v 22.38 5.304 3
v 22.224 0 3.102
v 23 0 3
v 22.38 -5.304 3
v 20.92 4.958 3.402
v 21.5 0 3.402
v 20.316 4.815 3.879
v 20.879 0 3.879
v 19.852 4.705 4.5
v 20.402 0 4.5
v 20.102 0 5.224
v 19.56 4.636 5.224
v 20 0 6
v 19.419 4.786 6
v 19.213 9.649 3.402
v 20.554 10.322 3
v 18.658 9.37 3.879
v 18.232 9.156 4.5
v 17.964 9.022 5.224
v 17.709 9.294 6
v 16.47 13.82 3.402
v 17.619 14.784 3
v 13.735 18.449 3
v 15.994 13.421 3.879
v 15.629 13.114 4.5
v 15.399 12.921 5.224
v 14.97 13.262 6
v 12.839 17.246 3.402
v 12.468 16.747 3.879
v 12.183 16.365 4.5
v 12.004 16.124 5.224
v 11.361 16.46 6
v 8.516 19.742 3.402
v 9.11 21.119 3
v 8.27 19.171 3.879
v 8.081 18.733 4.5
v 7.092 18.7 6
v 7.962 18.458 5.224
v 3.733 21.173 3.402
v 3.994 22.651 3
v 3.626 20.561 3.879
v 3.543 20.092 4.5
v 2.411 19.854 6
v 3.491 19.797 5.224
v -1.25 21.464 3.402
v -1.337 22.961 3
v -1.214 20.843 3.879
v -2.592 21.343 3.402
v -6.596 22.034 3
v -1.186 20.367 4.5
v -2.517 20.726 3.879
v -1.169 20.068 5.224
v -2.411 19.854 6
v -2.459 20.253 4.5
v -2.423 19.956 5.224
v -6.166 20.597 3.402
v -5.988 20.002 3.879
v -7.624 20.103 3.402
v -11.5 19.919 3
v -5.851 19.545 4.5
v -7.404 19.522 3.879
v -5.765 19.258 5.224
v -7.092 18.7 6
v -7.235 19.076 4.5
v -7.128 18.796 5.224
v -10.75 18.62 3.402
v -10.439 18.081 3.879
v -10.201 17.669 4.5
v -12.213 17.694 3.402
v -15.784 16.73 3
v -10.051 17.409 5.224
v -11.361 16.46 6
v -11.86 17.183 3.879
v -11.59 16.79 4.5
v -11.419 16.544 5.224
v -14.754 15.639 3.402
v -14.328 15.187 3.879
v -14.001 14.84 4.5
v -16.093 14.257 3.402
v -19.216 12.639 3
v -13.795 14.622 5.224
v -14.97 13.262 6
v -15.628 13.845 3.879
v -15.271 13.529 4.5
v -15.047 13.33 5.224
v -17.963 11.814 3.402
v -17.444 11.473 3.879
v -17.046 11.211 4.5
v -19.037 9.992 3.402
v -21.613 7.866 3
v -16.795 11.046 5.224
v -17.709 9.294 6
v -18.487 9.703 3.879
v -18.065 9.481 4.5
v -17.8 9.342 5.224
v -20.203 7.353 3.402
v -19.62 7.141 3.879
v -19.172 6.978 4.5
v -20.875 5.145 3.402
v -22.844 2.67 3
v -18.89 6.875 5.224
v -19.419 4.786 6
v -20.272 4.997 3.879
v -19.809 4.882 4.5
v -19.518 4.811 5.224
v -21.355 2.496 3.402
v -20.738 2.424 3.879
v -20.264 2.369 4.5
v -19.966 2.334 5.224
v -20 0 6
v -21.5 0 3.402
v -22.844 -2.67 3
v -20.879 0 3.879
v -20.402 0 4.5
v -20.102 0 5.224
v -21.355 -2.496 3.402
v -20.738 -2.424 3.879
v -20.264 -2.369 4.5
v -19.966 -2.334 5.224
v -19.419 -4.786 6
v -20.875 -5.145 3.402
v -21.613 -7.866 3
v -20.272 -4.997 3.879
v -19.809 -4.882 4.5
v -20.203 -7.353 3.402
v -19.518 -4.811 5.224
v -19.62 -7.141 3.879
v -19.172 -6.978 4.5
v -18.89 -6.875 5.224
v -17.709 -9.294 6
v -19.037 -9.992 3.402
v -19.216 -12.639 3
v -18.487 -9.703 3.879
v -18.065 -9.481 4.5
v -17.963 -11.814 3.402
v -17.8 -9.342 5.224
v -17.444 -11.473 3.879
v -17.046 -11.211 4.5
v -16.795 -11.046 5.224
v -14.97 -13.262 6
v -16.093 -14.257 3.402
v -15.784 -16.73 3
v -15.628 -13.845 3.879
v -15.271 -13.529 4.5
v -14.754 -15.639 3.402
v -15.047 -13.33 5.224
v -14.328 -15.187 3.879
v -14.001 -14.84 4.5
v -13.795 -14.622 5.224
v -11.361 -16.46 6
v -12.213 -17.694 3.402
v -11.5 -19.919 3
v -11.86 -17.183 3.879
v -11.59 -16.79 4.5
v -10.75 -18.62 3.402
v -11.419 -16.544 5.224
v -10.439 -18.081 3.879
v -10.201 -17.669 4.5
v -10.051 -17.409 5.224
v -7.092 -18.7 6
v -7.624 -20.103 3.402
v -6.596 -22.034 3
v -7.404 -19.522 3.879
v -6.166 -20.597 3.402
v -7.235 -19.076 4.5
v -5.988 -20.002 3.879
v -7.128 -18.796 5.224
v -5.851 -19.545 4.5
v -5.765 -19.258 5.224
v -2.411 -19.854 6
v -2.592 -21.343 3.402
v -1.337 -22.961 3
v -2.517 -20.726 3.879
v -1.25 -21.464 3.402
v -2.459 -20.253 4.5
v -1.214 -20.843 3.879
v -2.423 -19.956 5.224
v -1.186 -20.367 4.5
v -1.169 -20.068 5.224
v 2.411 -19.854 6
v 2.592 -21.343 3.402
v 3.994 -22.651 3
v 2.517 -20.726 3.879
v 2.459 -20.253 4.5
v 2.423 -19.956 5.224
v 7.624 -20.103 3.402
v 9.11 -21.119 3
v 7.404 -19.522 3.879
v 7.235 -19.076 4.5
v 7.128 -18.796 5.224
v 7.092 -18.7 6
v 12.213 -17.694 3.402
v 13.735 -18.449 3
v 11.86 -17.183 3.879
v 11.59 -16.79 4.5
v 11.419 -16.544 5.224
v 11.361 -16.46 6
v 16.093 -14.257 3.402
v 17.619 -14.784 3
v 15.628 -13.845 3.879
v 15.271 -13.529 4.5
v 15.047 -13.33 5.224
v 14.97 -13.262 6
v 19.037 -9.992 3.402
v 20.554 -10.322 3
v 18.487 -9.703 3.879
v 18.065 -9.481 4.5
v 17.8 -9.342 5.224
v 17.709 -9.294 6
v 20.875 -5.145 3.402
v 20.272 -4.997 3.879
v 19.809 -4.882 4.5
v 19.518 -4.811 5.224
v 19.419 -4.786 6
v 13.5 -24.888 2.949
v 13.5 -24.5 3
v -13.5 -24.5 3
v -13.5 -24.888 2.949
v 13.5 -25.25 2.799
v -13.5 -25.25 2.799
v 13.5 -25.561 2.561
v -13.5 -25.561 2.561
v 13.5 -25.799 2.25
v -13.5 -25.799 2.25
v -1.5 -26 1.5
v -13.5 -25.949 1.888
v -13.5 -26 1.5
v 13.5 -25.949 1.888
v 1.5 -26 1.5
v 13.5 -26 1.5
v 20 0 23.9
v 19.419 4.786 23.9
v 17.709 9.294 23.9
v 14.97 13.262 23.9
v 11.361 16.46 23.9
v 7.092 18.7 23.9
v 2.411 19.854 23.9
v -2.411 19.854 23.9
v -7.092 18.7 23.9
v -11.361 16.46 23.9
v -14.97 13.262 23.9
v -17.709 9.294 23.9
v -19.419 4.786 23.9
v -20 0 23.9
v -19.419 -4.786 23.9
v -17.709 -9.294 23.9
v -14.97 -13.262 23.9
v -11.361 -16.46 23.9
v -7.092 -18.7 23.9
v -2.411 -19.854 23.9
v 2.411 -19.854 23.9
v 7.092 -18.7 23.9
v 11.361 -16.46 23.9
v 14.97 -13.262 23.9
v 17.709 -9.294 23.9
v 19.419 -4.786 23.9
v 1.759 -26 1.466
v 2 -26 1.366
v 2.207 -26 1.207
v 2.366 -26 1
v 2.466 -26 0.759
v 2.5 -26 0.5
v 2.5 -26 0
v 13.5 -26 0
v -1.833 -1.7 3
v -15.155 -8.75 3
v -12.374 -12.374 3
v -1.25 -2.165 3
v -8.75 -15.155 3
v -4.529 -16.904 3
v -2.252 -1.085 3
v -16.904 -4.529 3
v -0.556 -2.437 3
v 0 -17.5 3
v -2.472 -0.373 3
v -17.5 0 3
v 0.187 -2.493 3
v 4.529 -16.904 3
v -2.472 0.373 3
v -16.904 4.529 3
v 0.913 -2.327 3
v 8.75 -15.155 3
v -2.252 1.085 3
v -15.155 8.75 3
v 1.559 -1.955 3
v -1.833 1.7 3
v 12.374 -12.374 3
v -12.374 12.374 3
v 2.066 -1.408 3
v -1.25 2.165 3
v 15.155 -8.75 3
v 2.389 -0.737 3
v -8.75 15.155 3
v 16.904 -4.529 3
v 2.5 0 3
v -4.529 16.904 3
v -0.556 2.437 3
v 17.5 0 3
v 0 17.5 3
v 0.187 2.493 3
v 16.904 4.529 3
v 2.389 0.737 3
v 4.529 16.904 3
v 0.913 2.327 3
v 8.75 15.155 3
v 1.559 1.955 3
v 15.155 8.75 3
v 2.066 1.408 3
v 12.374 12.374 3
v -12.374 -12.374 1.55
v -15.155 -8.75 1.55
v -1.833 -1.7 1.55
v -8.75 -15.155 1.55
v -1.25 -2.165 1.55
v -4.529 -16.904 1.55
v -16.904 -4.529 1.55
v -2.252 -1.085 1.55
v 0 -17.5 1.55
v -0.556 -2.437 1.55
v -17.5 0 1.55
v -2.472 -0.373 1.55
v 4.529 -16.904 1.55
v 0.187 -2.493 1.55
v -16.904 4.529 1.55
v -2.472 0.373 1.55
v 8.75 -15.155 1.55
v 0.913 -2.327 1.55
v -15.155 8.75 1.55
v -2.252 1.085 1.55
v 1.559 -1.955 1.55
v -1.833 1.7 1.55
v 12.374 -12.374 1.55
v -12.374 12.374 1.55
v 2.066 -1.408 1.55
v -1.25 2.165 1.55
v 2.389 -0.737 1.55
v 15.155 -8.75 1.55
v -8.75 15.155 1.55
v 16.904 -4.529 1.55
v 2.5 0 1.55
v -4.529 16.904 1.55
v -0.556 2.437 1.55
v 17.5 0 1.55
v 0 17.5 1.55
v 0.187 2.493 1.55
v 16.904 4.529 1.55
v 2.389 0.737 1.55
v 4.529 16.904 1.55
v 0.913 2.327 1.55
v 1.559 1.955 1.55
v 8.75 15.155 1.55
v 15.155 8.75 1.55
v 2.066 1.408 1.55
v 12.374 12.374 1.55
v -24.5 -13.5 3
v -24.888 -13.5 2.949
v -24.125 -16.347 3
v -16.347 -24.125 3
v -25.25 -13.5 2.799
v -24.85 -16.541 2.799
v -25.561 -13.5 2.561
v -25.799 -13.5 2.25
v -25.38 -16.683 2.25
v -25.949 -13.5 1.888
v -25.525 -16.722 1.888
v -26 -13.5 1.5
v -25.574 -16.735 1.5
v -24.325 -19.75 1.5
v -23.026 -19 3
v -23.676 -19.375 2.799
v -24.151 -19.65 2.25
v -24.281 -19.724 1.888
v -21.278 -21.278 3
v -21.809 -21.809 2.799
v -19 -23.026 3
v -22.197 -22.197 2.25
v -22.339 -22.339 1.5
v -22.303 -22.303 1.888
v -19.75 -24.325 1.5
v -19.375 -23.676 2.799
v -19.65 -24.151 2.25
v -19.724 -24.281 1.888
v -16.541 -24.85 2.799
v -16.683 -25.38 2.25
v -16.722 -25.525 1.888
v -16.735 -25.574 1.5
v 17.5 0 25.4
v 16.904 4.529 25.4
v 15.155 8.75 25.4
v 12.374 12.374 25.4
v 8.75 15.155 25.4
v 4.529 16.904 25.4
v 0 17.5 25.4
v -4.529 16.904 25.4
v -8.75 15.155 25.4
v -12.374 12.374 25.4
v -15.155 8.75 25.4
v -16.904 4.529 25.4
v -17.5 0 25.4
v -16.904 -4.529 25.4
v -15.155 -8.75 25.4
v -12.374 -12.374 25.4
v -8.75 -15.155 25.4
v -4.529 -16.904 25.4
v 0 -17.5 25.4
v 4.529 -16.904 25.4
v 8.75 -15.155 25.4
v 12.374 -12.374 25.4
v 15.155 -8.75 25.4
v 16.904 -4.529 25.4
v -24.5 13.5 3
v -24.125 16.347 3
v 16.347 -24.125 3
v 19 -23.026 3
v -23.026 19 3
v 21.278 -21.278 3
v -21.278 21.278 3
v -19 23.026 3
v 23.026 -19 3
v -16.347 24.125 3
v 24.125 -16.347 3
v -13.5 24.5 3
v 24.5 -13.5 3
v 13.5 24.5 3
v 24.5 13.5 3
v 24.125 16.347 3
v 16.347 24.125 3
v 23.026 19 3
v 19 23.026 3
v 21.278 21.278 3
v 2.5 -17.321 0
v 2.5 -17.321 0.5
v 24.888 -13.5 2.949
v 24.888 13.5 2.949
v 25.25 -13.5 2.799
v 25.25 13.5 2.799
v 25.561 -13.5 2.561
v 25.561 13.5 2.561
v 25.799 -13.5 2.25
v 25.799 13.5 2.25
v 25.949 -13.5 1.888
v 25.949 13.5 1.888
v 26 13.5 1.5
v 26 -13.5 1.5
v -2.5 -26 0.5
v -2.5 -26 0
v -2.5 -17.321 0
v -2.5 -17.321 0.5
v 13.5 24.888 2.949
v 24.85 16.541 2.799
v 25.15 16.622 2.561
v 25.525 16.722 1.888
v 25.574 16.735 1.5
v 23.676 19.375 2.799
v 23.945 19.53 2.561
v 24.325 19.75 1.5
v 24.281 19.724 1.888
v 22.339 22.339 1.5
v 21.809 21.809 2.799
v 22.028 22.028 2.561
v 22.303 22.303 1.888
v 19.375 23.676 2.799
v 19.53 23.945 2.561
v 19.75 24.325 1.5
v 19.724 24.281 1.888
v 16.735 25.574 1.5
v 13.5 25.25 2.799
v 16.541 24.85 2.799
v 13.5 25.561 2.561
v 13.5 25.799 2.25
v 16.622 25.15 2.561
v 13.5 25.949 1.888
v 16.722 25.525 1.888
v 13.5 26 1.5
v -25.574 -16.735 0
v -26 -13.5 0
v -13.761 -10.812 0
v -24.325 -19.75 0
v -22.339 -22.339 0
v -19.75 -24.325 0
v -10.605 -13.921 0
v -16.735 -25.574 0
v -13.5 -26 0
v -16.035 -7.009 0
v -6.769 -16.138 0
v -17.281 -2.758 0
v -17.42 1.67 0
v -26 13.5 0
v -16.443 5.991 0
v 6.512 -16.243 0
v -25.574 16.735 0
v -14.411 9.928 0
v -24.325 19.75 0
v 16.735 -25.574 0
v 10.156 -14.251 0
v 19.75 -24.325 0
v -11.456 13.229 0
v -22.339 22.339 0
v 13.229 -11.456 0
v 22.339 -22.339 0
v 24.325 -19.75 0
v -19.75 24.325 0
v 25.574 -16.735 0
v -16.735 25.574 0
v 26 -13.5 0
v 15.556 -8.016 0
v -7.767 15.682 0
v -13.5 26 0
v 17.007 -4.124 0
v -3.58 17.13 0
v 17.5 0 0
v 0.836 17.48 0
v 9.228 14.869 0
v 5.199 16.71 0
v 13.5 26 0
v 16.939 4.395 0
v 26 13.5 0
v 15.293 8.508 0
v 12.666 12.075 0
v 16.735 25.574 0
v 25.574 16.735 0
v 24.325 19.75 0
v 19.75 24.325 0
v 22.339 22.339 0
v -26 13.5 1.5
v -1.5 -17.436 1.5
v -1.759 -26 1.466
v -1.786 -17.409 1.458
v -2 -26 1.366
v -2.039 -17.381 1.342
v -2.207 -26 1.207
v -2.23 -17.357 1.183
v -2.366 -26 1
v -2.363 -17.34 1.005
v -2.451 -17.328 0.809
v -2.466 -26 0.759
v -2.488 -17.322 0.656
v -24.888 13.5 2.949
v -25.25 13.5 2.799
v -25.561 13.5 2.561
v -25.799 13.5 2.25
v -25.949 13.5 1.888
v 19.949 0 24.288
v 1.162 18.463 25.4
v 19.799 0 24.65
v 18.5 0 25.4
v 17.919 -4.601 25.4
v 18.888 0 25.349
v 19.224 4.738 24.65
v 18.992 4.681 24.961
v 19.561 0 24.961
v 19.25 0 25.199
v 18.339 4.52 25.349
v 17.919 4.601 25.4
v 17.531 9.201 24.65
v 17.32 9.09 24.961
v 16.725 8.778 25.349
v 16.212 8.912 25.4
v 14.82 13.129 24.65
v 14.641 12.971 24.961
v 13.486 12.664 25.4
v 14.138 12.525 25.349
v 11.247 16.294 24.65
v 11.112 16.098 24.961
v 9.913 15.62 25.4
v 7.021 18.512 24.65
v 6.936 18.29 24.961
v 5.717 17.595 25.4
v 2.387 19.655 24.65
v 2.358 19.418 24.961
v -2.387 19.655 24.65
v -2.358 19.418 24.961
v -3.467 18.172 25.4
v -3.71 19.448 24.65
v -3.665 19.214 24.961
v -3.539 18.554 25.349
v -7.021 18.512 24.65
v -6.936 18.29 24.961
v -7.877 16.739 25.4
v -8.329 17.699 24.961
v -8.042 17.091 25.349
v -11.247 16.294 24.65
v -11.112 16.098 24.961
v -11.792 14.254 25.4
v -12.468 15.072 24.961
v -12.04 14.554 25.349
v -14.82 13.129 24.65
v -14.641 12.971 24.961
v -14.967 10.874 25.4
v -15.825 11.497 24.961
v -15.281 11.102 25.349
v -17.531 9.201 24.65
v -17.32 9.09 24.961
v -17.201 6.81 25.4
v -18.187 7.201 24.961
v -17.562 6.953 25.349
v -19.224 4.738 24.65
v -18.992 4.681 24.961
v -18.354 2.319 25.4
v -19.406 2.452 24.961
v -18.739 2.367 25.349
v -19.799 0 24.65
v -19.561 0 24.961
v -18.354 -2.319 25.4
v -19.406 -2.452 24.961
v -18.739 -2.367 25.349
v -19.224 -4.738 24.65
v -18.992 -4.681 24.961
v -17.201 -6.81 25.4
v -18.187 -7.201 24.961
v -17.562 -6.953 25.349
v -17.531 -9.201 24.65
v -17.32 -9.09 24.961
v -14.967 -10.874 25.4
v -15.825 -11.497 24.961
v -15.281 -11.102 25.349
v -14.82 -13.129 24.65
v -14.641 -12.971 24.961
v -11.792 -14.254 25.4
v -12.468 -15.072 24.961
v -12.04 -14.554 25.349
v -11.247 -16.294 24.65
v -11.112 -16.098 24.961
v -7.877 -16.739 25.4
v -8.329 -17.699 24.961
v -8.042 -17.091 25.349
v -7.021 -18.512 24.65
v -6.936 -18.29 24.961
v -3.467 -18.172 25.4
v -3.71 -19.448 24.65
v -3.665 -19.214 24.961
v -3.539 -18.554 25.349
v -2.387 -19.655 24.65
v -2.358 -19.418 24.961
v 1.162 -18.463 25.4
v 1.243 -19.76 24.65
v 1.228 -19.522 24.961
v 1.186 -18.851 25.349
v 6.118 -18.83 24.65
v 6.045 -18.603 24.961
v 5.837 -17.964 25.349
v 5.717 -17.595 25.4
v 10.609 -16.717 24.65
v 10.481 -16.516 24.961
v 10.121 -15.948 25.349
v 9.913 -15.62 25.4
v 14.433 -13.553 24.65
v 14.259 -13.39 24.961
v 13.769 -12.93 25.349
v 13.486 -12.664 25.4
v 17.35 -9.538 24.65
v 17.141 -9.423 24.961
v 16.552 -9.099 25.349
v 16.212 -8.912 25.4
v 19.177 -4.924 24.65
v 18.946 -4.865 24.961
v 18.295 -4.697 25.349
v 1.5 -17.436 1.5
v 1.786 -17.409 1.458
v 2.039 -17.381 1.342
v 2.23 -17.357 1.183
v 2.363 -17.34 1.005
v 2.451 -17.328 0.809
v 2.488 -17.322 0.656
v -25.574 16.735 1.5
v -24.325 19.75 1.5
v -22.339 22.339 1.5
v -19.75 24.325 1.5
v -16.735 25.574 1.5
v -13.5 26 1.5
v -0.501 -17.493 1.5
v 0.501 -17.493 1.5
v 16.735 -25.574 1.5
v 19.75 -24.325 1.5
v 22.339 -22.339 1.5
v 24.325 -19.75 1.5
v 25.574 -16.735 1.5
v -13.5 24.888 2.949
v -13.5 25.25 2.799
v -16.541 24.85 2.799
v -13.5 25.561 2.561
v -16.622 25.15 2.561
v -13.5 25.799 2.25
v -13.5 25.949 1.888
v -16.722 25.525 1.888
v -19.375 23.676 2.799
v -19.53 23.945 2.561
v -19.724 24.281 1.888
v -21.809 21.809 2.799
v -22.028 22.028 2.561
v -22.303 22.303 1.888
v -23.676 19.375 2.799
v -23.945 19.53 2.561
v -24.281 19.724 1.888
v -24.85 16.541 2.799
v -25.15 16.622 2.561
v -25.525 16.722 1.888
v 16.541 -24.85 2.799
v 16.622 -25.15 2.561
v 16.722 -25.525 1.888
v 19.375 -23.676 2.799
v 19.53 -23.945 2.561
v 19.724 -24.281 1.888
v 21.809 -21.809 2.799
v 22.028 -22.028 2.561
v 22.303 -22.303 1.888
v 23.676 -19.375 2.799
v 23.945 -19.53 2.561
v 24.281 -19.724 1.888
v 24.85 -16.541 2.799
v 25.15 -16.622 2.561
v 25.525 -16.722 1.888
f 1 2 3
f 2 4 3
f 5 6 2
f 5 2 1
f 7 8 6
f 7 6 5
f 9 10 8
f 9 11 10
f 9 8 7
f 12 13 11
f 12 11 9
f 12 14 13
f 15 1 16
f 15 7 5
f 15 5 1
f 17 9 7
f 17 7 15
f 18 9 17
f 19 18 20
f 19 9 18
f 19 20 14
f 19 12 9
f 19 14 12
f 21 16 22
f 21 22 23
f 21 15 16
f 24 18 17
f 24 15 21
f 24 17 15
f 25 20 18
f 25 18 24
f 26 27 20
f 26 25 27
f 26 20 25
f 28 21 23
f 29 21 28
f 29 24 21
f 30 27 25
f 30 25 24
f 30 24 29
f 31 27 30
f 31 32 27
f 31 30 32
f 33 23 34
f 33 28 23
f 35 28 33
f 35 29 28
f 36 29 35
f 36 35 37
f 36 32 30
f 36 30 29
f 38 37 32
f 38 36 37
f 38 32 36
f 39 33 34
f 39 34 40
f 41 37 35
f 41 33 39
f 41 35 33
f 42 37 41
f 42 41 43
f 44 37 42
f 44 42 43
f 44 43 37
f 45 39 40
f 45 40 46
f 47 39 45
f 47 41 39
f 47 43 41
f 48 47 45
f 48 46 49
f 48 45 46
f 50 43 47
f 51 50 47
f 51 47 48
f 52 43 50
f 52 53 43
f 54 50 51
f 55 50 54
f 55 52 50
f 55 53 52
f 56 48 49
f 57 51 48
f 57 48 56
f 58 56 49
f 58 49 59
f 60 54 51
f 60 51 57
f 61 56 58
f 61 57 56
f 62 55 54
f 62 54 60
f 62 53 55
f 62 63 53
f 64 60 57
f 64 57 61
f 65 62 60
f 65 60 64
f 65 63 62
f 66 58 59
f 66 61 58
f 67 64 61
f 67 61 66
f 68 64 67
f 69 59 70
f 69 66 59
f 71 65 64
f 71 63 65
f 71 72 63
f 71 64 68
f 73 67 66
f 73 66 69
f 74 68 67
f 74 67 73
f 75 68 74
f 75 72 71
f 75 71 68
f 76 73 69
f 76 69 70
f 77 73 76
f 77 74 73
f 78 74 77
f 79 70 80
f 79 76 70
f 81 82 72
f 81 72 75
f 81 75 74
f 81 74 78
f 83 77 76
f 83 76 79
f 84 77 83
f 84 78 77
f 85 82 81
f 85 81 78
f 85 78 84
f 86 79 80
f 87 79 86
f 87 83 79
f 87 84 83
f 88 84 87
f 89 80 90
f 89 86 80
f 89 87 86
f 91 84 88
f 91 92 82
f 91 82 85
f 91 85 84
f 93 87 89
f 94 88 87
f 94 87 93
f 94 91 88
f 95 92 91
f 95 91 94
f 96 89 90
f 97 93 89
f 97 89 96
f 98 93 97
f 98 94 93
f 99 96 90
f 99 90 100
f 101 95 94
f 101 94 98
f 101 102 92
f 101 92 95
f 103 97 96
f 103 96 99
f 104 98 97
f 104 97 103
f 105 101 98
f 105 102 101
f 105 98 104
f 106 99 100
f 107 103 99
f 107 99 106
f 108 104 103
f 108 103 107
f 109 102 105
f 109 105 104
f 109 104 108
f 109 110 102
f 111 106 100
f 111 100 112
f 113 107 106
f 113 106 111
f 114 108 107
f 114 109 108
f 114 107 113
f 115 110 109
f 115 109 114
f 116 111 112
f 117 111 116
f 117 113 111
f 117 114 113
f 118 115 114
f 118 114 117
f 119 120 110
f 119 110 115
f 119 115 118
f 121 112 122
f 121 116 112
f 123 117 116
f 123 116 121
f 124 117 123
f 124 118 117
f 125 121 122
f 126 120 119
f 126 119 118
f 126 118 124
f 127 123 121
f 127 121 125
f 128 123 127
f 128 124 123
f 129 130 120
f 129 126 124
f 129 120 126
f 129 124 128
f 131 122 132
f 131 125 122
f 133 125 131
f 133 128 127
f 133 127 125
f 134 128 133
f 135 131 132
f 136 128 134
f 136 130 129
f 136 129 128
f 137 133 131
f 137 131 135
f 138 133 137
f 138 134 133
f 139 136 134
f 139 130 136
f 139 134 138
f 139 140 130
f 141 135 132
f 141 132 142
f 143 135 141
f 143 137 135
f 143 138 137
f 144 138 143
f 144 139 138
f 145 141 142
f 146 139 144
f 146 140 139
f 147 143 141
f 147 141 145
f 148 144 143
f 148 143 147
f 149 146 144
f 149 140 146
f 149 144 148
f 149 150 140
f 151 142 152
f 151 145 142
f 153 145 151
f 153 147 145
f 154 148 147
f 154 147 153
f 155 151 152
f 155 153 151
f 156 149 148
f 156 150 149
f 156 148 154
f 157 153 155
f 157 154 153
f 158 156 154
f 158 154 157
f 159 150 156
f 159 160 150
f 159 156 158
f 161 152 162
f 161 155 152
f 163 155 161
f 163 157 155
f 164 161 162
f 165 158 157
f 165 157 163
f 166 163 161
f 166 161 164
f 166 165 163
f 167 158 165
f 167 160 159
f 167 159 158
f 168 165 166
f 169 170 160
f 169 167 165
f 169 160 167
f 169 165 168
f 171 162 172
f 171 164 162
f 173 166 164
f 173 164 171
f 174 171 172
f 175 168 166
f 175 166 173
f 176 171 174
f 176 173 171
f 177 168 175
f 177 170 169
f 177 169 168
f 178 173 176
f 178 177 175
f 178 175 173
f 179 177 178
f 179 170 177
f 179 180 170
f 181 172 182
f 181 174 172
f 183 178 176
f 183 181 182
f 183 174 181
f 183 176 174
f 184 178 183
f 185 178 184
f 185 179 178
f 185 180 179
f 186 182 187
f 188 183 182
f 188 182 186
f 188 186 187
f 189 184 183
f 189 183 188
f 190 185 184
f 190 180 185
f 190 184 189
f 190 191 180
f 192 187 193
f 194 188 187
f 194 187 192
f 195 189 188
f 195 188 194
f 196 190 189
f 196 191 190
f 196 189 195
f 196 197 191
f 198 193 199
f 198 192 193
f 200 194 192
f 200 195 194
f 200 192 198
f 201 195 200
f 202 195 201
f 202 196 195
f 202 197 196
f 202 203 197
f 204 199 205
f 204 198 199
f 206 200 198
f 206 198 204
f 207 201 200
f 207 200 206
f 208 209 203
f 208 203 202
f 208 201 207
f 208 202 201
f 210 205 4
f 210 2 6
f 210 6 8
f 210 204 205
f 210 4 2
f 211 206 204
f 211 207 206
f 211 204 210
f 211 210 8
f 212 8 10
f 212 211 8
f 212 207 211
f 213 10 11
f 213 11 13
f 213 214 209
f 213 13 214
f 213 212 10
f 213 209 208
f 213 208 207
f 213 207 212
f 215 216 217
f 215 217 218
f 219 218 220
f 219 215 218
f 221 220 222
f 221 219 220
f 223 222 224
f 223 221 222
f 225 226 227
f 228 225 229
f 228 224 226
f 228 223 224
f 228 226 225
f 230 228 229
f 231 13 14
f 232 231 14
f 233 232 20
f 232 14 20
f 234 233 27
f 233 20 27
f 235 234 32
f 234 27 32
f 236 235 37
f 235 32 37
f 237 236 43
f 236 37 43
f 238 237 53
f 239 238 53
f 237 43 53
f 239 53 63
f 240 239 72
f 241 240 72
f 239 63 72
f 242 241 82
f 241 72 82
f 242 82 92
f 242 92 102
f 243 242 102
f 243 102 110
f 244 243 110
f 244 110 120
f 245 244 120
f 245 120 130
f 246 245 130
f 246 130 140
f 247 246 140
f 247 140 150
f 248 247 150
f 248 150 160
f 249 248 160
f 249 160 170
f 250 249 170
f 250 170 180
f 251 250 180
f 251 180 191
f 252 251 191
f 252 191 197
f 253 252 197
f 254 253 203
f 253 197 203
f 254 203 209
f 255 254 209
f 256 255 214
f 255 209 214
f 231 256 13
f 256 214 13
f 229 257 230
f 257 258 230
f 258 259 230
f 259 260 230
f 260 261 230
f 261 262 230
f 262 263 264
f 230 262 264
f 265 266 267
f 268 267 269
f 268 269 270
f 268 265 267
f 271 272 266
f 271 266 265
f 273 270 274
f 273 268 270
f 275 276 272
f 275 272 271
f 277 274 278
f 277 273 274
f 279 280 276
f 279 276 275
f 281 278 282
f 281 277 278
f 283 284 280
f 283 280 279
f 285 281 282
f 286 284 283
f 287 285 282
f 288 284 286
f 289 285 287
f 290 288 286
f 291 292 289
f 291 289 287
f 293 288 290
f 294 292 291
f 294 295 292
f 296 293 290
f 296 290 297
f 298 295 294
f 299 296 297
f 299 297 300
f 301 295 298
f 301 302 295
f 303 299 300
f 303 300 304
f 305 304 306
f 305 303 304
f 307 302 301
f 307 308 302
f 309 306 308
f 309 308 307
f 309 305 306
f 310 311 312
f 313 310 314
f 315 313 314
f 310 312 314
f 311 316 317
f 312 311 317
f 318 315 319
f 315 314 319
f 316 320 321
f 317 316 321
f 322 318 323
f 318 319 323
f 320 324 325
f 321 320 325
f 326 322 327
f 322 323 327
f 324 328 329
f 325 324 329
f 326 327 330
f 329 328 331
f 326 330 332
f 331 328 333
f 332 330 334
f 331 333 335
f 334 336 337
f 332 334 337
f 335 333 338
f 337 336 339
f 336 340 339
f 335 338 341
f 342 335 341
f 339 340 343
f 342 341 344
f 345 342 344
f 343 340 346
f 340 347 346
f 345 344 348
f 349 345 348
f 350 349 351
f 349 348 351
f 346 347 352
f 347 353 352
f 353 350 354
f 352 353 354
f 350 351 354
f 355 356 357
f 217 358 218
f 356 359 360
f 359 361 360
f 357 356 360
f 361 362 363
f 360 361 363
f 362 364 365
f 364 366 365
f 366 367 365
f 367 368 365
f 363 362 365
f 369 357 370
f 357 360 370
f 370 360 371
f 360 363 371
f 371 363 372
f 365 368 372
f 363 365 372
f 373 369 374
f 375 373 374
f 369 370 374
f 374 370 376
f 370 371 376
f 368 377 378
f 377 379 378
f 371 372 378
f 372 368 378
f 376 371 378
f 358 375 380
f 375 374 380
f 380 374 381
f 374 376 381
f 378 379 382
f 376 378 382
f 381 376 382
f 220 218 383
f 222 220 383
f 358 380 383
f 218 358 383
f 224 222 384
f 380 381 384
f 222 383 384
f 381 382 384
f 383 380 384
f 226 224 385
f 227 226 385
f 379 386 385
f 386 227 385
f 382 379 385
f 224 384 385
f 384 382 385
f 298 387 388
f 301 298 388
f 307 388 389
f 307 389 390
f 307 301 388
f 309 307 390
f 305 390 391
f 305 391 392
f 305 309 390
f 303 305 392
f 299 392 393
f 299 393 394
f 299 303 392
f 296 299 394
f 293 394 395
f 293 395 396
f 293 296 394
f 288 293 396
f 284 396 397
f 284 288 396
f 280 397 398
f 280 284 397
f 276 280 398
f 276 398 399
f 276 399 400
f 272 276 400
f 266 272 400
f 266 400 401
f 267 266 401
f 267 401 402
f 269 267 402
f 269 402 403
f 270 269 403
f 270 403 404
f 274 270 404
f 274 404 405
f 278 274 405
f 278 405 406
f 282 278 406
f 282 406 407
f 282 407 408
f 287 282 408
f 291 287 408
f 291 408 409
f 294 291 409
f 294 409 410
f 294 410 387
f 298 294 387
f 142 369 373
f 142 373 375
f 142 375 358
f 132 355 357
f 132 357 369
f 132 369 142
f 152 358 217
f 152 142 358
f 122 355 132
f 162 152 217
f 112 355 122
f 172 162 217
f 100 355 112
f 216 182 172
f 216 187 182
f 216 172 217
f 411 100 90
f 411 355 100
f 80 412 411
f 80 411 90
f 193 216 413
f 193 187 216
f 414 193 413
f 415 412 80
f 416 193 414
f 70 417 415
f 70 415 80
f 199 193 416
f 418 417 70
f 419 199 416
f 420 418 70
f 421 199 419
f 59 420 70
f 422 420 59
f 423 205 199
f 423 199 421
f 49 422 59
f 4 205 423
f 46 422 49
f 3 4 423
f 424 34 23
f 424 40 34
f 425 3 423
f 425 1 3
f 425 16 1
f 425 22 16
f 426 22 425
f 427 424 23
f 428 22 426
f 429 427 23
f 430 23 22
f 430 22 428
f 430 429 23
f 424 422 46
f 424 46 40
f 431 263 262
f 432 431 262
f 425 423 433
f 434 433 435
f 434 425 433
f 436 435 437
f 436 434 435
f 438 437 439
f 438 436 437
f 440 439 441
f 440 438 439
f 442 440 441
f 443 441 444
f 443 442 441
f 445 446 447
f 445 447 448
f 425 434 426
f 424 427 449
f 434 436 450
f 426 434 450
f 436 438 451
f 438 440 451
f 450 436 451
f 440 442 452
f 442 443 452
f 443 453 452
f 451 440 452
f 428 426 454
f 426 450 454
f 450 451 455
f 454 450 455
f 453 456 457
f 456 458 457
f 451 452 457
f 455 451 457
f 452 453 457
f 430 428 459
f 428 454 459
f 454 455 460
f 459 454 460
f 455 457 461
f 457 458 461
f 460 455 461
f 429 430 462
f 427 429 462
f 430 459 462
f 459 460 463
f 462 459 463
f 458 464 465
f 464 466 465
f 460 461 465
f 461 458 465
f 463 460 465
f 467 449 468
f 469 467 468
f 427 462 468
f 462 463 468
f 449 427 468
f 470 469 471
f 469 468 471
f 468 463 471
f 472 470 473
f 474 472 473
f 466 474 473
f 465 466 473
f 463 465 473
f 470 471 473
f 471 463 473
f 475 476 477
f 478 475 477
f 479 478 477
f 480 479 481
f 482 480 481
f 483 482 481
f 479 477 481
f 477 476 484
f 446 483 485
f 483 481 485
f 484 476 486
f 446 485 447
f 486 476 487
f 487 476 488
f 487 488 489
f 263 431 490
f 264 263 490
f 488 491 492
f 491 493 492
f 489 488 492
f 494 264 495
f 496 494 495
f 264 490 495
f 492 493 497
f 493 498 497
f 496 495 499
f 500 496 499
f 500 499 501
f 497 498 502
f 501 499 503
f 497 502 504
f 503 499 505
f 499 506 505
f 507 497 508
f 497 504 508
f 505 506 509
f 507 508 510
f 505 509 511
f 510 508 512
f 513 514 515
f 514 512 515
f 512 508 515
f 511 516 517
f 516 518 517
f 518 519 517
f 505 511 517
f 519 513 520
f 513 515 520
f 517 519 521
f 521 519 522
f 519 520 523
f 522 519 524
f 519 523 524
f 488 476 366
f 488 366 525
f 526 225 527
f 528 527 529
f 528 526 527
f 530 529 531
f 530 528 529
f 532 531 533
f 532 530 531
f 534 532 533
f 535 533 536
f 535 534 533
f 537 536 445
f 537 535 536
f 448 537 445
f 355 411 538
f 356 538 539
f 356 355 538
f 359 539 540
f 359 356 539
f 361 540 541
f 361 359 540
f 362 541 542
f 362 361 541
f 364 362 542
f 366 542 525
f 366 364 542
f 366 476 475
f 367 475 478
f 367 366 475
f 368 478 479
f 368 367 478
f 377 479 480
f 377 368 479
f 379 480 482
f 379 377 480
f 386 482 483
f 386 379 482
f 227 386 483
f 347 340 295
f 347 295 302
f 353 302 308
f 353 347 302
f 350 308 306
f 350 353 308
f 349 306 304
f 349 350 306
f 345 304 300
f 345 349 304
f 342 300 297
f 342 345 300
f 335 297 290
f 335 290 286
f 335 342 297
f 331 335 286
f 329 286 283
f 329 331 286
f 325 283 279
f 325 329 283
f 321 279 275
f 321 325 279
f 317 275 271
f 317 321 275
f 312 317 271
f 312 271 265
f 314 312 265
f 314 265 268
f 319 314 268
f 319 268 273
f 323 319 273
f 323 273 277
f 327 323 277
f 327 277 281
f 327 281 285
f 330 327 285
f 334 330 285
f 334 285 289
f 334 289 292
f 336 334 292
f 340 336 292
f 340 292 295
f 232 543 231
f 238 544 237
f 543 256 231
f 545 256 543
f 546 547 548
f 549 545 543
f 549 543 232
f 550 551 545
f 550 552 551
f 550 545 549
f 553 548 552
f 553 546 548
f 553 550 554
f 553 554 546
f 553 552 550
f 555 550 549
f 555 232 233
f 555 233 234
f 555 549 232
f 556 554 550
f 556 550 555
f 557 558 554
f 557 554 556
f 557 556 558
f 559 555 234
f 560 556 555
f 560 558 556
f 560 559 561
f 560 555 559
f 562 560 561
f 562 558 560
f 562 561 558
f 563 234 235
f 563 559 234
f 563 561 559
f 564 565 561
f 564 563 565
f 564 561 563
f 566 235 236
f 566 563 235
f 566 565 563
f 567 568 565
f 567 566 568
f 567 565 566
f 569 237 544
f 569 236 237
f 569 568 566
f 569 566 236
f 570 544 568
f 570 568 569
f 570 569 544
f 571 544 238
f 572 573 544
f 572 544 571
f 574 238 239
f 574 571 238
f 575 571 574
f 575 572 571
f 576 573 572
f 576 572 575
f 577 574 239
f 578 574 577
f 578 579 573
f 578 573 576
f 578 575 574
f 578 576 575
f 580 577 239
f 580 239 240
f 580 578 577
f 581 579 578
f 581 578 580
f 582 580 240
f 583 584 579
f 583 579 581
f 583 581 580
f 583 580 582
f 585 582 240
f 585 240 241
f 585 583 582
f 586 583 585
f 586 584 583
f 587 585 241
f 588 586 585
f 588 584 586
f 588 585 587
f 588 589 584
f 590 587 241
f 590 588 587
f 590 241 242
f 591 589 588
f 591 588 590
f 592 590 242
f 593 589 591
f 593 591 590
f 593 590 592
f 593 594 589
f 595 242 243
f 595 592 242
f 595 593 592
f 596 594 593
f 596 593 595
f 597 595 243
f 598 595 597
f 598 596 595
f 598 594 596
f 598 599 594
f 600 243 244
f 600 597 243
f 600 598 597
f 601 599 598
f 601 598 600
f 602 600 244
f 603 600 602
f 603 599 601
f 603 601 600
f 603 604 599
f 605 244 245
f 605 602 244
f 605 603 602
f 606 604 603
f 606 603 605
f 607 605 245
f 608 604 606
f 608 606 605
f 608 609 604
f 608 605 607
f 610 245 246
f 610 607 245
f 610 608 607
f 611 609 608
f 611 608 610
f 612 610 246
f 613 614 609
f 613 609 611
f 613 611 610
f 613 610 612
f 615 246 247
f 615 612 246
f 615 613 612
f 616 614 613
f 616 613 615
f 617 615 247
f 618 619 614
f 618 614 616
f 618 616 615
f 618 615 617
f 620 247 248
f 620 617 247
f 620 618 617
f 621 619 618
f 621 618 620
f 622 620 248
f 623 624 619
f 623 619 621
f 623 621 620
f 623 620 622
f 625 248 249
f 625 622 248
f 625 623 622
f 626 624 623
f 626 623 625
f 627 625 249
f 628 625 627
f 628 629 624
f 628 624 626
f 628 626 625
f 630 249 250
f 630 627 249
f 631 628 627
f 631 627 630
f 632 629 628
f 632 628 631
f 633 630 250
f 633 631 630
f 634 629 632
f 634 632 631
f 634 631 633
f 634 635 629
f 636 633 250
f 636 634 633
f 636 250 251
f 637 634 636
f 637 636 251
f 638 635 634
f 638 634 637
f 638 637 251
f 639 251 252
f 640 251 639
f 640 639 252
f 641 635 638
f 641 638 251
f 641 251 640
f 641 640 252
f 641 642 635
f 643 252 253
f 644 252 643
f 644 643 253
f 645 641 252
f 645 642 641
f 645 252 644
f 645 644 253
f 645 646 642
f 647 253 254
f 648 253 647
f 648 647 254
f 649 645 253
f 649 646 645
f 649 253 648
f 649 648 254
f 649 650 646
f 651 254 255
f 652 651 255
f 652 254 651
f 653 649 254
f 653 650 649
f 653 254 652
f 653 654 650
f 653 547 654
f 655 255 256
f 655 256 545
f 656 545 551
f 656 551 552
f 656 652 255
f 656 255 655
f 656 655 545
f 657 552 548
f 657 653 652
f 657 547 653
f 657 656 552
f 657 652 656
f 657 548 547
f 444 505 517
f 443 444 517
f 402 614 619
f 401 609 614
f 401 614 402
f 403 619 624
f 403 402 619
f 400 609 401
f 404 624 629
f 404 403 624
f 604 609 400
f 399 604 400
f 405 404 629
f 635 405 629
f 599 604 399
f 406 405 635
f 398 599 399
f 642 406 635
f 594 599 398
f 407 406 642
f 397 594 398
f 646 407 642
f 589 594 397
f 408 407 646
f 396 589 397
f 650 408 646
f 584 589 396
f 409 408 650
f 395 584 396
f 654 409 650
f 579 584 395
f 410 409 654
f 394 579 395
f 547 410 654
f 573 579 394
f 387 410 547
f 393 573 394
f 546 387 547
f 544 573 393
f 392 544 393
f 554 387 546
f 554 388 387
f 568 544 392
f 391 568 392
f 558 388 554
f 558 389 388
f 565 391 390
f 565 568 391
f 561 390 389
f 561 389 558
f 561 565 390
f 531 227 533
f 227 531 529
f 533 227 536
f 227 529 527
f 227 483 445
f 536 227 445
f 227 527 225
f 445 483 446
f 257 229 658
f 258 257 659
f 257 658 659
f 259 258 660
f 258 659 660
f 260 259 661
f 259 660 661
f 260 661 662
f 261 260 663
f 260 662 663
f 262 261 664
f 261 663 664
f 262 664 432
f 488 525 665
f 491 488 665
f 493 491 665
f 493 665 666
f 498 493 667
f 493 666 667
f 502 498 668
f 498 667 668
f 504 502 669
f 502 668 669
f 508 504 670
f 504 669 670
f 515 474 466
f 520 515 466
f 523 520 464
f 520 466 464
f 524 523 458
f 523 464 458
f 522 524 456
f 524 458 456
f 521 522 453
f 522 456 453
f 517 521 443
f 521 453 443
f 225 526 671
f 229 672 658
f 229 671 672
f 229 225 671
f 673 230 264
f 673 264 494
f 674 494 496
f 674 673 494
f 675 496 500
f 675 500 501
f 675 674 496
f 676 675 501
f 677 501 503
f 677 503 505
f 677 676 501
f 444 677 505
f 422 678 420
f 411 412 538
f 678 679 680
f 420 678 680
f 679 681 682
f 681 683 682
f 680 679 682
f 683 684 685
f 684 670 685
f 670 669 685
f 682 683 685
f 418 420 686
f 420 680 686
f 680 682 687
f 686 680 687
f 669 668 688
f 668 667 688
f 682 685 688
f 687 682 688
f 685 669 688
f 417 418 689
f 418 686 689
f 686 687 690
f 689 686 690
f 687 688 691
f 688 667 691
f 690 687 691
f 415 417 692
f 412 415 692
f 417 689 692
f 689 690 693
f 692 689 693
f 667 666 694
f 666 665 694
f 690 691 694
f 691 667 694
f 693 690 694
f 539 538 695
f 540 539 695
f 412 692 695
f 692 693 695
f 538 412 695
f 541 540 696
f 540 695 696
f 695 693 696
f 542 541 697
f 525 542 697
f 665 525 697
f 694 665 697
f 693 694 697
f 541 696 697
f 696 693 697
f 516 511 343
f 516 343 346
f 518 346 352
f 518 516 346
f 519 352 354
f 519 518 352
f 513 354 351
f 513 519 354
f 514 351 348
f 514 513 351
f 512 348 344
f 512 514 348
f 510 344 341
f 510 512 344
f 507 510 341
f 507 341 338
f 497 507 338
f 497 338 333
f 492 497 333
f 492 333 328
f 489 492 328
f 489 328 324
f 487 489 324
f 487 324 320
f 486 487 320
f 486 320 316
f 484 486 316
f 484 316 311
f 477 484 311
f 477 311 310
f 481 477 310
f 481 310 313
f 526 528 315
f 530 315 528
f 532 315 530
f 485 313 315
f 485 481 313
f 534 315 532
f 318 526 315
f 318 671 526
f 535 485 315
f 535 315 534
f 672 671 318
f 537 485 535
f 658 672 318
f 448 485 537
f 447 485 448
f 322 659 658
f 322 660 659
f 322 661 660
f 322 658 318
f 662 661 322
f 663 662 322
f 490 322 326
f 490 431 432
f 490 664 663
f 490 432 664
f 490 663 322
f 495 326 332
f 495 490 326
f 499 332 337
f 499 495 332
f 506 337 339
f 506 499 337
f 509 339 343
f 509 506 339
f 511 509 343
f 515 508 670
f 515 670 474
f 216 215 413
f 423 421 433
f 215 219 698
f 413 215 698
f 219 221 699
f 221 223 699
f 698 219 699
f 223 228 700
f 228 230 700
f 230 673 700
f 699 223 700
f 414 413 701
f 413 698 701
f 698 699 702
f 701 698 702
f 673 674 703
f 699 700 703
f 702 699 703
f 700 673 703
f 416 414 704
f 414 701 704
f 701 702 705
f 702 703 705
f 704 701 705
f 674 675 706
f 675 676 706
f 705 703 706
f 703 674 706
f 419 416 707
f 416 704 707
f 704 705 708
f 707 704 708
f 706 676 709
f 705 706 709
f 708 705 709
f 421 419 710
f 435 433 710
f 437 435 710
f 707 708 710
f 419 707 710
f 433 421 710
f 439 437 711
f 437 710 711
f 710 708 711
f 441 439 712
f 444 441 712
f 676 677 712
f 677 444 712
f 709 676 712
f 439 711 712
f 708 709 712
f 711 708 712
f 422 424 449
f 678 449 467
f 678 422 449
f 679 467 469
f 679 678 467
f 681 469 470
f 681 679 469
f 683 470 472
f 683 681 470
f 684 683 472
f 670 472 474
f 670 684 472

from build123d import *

# Parameters (mm, degrees)
F0_W     = 52
F0_H     = 52
F0_R     = 20
F1_DEPTH = 3
F0_R_2   = 17.5
F0_R_3   = 2.5
F2_DEPTH = 25.4
F3_DEPTH = 1.55
F4_R     = 12.5
F5_R     = 1.5
F6_R     = 3
F7_W     = 5
F7_H     = 1.5
F8_DEPTH = 25.4
F9_R     = 1


with BuildPart() as f1:
    # F0 (on Top) → F1 (new body)
    with BuildSketch(Plane.XY):
        Rectangle(F0_W, F0_H)
        Circle(F0_R, mode=Mode.SUBTRACT)
    extrude(amount=F1_DEPTH)



with BuildPart() as f1b:
    # F0 (on Top) → F1, piece 2 (new body)
    with BuildSketch(Plane.XY):
        Circle(F0_R_2)
        Circle(F0_R_3, mode=Mode.SUBTRACT)
    extrude(amount=F1_DEPTH)


with BuildPart() as f1_1:
    add(f1.part)

    add(f1b.part)  # F2 merges F1b
    # F0 (on Top) → F2 (join)
    with BuildSketch(Plane.XY):
        Circle(F0_R)
        Circle(F0_R_2, mode=Mode.SUBTRACT)
    extrude(amount=F2_DEPTH)

    # F0 (on Top) → F3 (cut)
    with BuildSketch(Plane.XY):
        Circle(F0_R_2)
        Circle(F0_R_3, mode=Mode.SUBTRACT)
    extrude(amount=F3_DEPTH, mode=Mode.SUBTRACT)

    # F4
    f4_edges = [f1_1.edges().sort_by_distance(p)[0] for p in [
        (-26, 26, 1.5),
        (26, 26, 1.5),
        (26, -26, 1.5),
        (-26, -26, 1.5),
    ]]
    fillet(f4_edges, radius=F4_R)

    # F5
    f5_edges = [f1_1.edges().sort_by_distance(p)[0] for p in [
        (-20, 0, 25.4),
        (0, -26, 3),
    ]]
    fillet(f5_edges, radius=F5_R)

    # F6
    f6_edges = [f1_1.edges().sort_by_distance(p)[0] for p in [
        (-20, 0, 3),
    ]]
    fillet(f6_edges, radius=F6_R)

    # F7 (on face) → F8 (cut)
    with BuildSketch(Plane.XZ.offset(26)):
        with Locations((0, 0.75)):
            Rectangle(F7_W, F7_H)
    extrude(amount=-F8_DEPTH, mode=Mode.SUBTRACT)

    # F9
    f9_edges = [f1_1.edges().sort_by_distance(p)[0] for p in [
        (-2.5, -21.660254, 1.5),
        (2.5, -21.660254, 1.5),
    ]]
    fillet(f9_edges, radius=F9_R)


solid = f1_1.part
